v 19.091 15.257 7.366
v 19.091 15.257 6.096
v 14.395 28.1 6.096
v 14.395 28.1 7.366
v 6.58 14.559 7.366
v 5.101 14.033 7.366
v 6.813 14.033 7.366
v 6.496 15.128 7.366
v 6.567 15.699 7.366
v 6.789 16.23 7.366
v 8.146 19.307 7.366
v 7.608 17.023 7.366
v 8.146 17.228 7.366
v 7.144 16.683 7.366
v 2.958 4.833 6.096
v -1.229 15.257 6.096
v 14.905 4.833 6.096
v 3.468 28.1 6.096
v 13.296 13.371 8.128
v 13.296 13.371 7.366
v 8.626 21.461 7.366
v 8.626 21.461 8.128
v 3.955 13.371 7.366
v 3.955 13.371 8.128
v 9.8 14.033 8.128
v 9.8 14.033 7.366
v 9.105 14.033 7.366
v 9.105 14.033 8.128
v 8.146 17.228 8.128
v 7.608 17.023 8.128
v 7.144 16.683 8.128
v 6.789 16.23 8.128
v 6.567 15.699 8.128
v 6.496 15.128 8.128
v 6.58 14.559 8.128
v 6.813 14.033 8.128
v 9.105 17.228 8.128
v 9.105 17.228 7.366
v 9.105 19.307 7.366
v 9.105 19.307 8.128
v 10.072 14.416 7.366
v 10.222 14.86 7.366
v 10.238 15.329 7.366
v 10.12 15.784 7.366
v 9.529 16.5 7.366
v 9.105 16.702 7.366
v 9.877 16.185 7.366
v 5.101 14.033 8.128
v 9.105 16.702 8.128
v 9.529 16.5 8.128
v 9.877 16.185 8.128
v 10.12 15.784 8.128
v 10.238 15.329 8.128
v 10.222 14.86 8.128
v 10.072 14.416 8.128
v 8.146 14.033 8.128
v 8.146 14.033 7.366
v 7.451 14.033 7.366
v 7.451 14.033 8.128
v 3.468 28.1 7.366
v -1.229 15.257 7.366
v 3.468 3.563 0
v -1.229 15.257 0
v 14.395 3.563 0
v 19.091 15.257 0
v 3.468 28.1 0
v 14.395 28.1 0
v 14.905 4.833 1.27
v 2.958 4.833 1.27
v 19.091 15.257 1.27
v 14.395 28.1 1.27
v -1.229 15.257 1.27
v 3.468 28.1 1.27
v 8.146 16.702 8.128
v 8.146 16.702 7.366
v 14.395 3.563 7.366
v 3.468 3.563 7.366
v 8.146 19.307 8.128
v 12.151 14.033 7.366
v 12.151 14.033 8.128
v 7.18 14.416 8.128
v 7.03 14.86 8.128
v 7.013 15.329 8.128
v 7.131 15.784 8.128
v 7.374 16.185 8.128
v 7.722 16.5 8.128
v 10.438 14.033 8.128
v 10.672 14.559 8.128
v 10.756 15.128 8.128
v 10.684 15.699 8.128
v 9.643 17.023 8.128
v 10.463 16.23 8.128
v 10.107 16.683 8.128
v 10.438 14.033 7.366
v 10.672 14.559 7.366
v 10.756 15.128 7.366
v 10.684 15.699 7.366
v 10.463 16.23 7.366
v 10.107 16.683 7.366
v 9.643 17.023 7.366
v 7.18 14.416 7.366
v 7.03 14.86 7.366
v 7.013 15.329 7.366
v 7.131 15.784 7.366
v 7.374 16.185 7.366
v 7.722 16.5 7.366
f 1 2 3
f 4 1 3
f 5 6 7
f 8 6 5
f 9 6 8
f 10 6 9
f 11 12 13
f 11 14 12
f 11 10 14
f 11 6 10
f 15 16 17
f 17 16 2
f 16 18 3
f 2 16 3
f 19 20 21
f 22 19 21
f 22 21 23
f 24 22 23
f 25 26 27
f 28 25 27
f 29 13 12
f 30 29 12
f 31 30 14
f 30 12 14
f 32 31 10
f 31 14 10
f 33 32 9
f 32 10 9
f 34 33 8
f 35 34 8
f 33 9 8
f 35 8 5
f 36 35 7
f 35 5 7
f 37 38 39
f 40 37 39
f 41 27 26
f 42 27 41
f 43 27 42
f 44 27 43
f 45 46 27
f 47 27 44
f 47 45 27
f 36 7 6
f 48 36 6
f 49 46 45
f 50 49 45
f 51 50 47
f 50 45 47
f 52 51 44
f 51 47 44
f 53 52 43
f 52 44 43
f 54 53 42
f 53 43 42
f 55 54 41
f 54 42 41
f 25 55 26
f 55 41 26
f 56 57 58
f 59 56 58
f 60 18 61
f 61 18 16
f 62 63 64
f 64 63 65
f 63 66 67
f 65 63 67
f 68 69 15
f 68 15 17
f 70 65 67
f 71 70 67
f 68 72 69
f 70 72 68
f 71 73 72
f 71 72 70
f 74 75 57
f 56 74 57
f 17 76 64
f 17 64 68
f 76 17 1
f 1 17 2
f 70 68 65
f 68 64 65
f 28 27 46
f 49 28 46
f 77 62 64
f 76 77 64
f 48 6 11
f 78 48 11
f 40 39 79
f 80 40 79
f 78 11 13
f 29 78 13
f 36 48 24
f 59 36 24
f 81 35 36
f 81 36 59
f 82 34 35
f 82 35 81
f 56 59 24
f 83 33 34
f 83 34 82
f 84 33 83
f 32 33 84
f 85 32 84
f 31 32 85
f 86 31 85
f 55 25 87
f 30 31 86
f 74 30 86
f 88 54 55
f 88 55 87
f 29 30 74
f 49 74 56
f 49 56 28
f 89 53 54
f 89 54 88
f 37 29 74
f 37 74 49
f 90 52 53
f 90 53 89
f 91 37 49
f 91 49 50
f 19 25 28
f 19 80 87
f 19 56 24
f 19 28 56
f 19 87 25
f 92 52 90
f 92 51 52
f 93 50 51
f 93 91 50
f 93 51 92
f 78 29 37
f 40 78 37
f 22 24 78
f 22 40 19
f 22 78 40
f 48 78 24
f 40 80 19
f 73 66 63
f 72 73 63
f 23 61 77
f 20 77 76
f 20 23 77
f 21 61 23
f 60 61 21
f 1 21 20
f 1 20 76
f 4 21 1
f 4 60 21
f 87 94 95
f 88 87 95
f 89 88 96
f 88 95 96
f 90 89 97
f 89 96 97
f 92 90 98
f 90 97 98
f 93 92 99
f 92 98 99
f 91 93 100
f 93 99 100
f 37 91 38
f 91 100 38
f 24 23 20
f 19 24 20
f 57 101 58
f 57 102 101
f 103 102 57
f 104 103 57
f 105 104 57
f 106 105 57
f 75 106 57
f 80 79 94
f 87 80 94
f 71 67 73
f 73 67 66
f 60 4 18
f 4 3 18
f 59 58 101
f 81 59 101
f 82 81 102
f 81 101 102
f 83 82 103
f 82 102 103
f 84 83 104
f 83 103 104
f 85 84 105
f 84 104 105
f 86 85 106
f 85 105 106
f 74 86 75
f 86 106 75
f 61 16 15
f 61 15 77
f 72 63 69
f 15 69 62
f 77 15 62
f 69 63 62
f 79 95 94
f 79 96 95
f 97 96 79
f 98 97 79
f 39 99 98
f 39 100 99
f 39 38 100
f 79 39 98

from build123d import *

# Parameters (mm, degrees)
F1_DEPTH = 7.366
F2_T     = -1.27
F4_DEPTH = 0.762


with BuildPart() as f1:
    # F0 (on Top) → F1 (new body)
    with BuildSketch(Plane.XY):
        Polygon((14.39459, 28.100452), (3.467799, 28.100452), (-1.228805, 15.256678), (3.467799, 3.563094), (8.931195, 3.563094), (14.39459, 3.563094), (19.091195, 15.256678), align=None)
    extrude(amount=F1_DEPTH)

    # F2
    f2_openings = [f1.faces().sort_by_distance(p)[0] for p in [
        (8.931195, 28.100452, 3.683),
        (16.742892, 21.678565, 3.683),
        (16.742892, 9.409886, 3.683),
        (1.119497, 21.678565, 3.683),
        (1.119497, 9.409886, 3.683),
    ]]
    offset(amount=F2_T, openings=f2_openings)

    # F3 (on face) → F4 (join)
    with BuildSketch(Plane.XY.offset(7.366)):
        Polygon((3.955232, 13.371391), (13.296179, 13.371391), (8.625706, 21.460889), align=None)
        with BuildLine():
            ThreePointArc((7.451111, 14.032797), (7.055542, 15.560872), (8.146025, 16.702071))
            Line((8.146025, 16.702071), (8.146025, 14.032797))
            Line((8.146025, 14.032797), (7.451111, 14.032797))
        make_face(mode=Mode.SUBTRACT)
        with BuildLine():
            ThreePointArc((9.105387, 16.702071), (10.195869, 15.560872), (9.8003, 14.032797))
            Line((9.8003, 14.032797), (9.105387, 14.032797))
            Line((9.105387, 14.032797), (9.105387, 16.702071))
        make_face(mode=Mode.SUBTRACT)
        with BuildLine():
            Line((6.813301, 14.032797), (5.10082, 14.032797))
            Line((5.10082, 14.032797), (8.146025, 19.307246))
            Line((8.146025, 19.307246), (8.146025, 17.227563))
            ThreePointArc((8.146025, 17.227563), (6.659733, 15.972221), (6.813301, 14.032797))
        make_face(mode=Mode.SUBTRACT)
        with BuildLine():
            Line((9.105387, 19.307246), (12.150591, 14.032797))
            Line((12.150591, 14.032797), (10.438111, 14.032797))
            ThreePointArc((10.438111, 14.032797), (10.591678, 15.972221), (9.105387, 17.227563))
            Line((9.105387, 17.227563), (9.105387, 19.307246))
        make_face(mode=Mode.SUBTRACT)
    extrude(amount=F4_DEPTH)


solid = f1.part
